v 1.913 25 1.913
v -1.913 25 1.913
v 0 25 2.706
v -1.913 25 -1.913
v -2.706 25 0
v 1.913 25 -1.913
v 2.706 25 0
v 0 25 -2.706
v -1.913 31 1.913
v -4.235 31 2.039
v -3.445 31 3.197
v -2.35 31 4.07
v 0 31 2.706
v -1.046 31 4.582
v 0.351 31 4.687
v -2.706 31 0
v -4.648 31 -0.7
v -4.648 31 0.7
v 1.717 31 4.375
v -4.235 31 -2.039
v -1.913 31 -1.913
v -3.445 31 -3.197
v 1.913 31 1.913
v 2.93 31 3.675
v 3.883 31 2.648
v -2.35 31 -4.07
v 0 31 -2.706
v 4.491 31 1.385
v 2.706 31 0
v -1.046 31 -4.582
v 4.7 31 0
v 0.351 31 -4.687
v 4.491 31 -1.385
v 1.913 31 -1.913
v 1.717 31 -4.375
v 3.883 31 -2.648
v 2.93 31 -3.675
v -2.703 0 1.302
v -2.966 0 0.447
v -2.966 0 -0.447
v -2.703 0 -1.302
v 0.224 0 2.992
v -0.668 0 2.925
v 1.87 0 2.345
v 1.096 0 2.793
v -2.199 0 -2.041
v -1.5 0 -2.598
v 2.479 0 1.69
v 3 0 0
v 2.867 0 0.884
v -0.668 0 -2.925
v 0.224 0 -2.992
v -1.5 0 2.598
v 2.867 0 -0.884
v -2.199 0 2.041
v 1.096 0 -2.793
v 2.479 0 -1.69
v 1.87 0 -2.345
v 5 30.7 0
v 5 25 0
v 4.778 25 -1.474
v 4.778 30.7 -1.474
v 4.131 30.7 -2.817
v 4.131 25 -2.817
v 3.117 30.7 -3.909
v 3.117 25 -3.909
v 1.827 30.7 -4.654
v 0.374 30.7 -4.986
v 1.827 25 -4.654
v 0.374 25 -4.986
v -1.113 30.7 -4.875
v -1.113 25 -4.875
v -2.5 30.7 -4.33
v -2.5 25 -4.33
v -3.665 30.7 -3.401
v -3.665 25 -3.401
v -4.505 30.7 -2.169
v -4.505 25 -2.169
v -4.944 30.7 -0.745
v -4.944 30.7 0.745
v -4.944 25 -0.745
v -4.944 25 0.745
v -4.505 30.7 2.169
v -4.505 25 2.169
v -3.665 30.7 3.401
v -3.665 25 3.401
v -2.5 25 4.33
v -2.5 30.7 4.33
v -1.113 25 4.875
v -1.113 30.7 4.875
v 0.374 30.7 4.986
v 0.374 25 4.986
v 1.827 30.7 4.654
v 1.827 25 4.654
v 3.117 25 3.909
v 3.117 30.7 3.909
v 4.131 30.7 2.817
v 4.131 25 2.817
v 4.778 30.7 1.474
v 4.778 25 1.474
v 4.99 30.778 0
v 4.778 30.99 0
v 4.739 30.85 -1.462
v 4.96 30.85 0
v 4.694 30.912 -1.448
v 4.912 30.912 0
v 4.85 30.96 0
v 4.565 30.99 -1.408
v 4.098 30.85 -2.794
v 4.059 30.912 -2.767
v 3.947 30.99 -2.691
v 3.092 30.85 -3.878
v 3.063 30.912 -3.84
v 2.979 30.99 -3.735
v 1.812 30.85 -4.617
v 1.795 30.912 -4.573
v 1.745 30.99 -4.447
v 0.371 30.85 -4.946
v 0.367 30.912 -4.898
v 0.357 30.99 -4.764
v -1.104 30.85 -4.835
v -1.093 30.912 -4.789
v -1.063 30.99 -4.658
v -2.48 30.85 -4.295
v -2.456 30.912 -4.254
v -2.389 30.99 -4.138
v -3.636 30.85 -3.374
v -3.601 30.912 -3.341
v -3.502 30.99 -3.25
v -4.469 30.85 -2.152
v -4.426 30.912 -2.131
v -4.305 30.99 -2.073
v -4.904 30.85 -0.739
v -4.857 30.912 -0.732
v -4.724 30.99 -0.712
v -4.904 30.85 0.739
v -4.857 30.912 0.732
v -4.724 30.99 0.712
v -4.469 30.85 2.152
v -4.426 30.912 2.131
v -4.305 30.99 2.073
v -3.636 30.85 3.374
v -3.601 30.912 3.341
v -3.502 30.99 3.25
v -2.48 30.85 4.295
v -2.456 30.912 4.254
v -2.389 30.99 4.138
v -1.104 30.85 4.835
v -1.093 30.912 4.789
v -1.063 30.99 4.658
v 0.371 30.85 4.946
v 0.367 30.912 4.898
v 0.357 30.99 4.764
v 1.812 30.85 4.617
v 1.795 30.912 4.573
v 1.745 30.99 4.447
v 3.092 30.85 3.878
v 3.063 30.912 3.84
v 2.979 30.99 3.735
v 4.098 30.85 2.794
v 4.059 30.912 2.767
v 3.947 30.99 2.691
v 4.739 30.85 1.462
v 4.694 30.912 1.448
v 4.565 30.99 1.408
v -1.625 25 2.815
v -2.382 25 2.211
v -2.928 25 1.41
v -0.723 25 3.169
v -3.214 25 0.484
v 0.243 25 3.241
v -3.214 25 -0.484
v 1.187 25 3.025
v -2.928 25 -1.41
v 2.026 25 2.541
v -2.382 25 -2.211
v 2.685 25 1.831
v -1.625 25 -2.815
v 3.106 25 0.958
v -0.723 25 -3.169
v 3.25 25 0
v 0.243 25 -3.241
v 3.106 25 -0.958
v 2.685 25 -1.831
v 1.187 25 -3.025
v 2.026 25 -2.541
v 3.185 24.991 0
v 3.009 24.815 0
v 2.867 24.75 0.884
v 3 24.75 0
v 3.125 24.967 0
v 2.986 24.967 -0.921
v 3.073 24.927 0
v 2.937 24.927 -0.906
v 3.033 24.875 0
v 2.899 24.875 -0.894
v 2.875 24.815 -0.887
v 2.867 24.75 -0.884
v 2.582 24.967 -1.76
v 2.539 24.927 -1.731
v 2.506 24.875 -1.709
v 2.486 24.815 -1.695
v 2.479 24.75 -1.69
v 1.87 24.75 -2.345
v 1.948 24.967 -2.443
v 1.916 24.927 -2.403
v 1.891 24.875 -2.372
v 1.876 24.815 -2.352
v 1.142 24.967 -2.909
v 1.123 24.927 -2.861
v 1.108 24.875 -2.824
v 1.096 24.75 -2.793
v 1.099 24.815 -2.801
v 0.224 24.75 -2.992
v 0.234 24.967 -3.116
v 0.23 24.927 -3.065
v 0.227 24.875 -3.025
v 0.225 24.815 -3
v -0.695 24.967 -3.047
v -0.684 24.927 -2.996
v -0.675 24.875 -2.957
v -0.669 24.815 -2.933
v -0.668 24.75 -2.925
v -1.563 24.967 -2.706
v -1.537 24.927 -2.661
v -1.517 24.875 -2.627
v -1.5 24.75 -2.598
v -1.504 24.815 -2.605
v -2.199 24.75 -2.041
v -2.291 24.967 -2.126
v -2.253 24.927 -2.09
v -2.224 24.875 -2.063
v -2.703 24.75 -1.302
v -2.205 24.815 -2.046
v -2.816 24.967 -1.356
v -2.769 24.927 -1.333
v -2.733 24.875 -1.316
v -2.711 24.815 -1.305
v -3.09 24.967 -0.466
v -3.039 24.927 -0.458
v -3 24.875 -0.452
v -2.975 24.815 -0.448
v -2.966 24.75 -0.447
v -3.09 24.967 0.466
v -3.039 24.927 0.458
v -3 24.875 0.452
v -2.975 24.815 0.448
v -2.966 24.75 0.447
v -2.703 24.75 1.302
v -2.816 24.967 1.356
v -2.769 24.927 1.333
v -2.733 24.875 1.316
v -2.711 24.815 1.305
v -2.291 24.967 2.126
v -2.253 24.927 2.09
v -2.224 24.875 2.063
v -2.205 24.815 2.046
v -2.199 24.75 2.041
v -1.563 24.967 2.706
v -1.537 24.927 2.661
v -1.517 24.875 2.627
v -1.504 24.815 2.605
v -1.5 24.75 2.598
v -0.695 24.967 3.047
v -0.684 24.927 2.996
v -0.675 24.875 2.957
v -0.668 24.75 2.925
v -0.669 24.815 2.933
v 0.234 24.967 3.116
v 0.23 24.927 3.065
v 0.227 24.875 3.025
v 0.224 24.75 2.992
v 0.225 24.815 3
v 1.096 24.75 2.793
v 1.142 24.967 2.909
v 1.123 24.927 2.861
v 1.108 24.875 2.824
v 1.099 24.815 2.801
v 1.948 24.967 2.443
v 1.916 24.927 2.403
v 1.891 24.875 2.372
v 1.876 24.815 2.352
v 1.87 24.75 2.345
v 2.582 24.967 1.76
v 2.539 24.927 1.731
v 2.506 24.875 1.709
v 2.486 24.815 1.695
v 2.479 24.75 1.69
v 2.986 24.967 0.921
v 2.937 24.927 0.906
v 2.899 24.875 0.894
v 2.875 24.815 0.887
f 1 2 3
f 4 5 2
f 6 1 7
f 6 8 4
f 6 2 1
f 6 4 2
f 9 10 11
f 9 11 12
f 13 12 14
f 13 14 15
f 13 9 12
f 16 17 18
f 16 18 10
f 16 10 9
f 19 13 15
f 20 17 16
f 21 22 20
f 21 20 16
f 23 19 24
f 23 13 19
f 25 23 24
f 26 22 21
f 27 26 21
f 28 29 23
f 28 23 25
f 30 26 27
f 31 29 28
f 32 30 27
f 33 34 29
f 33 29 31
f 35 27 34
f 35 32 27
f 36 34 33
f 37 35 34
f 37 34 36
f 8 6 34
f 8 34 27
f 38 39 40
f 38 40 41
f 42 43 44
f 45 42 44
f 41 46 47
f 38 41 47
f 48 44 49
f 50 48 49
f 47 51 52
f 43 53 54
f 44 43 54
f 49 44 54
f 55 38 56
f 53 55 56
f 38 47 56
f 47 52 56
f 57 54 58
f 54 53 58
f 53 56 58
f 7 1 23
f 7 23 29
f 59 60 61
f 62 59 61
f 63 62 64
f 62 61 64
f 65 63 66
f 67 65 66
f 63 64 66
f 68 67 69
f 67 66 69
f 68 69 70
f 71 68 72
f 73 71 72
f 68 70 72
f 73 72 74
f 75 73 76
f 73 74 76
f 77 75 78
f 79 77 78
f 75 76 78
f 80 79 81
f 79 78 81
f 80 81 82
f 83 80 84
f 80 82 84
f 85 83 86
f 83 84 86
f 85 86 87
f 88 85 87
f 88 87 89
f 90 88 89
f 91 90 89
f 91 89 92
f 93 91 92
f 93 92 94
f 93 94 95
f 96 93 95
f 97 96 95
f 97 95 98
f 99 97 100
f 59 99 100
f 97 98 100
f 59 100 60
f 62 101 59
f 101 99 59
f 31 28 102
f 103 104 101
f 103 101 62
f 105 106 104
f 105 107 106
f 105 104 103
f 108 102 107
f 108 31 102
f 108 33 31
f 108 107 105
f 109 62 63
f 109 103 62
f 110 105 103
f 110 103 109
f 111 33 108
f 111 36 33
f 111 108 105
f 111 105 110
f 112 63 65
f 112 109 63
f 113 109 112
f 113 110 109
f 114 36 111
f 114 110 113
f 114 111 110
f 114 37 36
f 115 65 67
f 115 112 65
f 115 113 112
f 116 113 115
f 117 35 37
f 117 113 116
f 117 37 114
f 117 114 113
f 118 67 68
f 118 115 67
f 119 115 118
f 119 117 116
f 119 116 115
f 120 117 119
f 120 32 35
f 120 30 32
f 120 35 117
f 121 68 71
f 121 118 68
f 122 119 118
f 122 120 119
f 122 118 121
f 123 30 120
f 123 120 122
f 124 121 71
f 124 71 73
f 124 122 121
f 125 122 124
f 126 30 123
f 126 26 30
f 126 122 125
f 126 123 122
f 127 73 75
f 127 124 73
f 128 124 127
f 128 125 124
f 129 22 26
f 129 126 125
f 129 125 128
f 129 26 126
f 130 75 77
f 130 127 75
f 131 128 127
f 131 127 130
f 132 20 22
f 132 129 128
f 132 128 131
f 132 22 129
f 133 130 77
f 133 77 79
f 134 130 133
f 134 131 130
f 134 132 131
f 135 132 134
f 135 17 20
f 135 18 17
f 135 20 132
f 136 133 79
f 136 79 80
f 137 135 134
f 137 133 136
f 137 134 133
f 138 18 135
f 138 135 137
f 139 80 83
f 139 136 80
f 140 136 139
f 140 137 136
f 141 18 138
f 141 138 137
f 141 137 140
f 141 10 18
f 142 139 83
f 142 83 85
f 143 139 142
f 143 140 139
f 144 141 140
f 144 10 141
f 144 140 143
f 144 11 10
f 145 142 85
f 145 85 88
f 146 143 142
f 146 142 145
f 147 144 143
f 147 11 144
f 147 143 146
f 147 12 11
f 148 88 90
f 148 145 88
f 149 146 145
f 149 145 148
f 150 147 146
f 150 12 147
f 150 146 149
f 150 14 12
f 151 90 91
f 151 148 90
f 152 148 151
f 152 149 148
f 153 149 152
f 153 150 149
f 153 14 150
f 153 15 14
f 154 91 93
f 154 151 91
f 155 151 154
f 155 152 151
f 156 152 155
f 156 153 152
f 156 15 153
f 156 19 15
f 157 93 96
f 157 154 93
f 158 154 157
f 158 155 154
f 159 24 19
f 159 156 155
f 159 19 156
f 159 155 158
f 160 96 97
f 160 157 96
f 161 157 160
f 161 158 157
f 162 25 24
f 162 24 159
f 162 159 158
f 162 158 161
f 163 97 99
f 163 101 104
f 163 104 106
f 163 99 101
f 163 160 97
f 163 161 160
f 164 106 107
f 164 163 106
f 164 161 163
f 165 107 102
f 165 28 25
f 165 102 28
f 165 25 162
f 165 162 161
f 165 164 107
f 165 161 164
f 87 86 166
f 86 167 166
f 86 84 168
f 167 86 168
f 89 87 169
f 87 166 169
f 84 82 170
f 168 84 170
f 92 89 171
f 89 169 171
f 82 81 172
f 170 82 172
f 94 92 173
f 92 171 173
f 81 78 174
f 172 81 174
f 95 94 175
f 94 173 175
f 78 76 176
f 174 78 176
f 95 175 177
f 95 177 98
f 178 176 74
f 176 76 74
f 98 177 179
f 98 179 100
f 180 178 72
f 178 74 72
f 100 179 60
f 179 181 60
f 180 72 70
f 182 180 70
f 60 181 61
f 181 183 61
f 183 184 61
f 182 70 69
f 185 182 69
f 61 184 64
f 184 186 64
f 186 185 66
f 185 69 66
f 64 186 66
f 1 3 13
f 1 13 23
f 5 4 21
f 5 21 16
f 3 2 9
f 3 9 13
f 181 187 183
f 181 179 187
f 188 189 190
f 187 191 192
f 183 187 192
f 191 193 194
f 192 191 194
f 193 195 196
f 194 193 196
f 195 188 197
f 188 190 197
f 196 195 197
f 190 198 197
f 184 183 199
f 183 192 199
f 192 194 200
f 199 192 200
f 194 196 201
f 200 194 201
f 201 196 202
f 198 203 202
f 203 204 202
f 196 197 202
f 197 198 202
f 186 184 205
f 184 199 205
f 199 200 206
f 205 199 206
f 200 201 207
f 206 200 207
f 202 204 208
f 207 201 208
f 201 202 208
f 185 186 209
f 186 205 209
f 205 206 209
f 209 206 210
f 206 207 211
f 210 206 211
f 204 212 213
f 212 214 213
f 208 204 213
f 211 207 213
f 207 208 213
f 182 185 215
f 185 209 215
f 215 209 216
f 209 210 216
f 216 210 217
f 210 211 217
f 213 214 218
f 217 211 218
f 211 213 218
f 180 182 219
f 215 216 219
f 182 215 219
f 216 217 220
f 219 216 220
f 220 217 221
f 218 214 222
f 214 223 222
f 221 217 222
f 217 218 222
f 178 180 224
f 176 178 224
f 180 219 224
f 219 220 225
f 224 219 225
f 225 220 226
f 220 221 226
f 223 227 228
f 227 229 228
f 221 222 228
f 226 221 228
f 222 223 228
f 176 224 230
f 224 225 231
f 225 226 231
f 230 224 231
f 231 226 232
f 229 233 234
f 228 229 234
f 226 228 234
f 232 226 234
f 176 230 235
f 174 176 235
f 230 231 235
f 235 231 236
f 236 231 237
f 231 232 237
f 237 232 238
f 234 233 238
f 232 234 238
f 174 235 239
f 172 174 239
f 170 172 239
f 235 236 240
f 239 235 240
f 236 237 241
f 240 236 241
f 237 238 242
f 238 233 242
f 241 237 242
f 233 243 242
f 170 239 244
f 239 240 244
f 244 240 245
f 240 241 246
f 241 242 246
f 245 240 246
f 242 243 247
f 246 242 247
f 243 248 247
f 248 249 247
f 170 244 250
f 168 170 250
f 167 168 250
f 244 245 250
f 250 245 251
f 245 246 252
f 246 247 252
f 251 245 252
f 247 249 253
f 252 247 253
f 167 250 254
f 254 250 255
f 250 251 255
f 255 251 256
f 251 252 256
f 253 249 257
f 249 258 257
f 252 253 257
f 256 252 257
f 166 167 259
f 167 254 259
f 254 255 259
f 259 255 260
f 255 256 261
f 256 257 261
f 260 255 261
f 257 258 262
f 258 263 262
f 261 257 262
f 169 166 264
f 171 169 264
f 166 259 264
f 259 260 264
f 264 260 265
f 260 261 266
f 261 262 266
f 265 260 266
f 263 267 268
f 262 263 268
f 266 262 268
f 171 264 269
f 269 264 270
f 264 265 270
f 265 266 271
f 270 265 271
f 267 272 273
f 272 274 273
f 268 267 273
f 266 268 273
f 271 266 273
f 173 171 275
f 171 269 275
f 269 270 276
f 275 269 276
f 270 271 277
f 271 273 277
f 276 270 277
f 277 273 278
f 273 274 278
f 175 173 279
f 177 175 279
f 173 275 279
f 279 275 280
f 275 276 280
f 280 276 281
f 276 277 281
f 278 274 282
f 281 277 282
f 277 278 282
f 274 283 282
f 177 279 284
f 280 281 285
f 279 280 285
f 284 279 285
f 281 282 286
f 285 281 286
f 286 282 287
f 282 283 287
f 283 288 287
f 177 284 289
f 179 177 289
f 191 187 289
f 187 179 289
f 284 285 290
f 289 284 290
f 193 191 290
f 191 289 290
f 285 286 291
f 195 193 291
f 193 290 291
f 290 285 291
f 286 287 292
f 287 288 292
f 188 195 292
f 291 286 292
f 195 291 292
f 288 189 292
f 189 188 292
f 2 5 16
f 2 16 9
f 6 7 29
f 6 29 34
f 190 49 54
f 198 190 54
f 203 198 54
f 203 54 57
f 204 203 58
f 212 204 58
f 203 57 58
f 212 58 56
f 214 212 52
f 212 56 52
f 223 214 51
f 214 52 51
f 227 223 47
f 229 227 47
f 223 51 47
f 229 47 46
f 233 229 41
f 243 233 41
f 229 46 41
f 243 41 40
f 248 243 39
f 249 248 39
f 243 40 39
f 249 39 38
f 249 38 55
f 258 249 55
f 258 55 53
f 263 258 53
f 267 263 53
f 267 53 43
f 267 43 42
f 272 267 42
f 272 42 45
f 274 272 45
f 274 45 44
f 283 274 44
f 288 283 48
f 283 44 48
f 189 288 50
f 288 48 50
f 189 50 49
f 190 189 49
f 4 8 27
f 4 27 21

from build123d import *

# Parameters (mm, degrees)
SKETCH1_R           = 3
BOSS_EXTRUDE1_DEPTH = 25
SKETCH2_R           = 5
SKETCH2_R_2         = 3
BOSS_EXTRUDE2_DEPTH = 6
FILLET1_R           = 0.3
FILLET2_R           = 0.25


with BuildPart() as part:
    # Sketch1 → Boss-Extrude1 (new body)
    with BuildSketch(Plane(origin=(0, 0, 0), x_dir=(1, 0, 0), z_dir=(0, 1, 0))):
        Circle(SKETCH1_R)
    extrude(amount=BOSS_EXTRUDE1_DEPTH)

    # Sketch2 → Boss-Extrude2 (add)
    with BuildSketch(Plane(origin=(0, 25, 0), x_dir=(1, 0, 0), z_dir=(0, 1, 0))):
        Circle(SKETCH2_R)
        Circle(SKETCH2_R_2, mode=Mode.SUBTRACT)
        Circle(SKETCH2_R_2)
        Polygon((1.913417162, -1.913417162), (2.705980501, 0), (1.913417162, 1.913417162), (0, 2.705980501), (-1.913417162, 1.913417162), (-2.705980501, 0), (-1.913417162, -1.913417162), (0, -2.705980501), align=None, mode=Mode.SUBTRACT)
    extrude(amount=BOSS_EXTRUDE2_DEPTH)

    # Fillet1
    fillet1_edges = [part.edges().sort_by_distance(p)[0] for p in [
        (-5, 31, 0),
    ]]
    fillet(fillet1_edges, radius=FILLET1_R)

    # Fillet2
    fillet2_edges = [part.edges().sort_by_distance(p)[0] for p in [
        (-3, 25, 0),
    ]]
    fillet(fillet2_edges, radius=FILLET2_R)


solid = part.part
